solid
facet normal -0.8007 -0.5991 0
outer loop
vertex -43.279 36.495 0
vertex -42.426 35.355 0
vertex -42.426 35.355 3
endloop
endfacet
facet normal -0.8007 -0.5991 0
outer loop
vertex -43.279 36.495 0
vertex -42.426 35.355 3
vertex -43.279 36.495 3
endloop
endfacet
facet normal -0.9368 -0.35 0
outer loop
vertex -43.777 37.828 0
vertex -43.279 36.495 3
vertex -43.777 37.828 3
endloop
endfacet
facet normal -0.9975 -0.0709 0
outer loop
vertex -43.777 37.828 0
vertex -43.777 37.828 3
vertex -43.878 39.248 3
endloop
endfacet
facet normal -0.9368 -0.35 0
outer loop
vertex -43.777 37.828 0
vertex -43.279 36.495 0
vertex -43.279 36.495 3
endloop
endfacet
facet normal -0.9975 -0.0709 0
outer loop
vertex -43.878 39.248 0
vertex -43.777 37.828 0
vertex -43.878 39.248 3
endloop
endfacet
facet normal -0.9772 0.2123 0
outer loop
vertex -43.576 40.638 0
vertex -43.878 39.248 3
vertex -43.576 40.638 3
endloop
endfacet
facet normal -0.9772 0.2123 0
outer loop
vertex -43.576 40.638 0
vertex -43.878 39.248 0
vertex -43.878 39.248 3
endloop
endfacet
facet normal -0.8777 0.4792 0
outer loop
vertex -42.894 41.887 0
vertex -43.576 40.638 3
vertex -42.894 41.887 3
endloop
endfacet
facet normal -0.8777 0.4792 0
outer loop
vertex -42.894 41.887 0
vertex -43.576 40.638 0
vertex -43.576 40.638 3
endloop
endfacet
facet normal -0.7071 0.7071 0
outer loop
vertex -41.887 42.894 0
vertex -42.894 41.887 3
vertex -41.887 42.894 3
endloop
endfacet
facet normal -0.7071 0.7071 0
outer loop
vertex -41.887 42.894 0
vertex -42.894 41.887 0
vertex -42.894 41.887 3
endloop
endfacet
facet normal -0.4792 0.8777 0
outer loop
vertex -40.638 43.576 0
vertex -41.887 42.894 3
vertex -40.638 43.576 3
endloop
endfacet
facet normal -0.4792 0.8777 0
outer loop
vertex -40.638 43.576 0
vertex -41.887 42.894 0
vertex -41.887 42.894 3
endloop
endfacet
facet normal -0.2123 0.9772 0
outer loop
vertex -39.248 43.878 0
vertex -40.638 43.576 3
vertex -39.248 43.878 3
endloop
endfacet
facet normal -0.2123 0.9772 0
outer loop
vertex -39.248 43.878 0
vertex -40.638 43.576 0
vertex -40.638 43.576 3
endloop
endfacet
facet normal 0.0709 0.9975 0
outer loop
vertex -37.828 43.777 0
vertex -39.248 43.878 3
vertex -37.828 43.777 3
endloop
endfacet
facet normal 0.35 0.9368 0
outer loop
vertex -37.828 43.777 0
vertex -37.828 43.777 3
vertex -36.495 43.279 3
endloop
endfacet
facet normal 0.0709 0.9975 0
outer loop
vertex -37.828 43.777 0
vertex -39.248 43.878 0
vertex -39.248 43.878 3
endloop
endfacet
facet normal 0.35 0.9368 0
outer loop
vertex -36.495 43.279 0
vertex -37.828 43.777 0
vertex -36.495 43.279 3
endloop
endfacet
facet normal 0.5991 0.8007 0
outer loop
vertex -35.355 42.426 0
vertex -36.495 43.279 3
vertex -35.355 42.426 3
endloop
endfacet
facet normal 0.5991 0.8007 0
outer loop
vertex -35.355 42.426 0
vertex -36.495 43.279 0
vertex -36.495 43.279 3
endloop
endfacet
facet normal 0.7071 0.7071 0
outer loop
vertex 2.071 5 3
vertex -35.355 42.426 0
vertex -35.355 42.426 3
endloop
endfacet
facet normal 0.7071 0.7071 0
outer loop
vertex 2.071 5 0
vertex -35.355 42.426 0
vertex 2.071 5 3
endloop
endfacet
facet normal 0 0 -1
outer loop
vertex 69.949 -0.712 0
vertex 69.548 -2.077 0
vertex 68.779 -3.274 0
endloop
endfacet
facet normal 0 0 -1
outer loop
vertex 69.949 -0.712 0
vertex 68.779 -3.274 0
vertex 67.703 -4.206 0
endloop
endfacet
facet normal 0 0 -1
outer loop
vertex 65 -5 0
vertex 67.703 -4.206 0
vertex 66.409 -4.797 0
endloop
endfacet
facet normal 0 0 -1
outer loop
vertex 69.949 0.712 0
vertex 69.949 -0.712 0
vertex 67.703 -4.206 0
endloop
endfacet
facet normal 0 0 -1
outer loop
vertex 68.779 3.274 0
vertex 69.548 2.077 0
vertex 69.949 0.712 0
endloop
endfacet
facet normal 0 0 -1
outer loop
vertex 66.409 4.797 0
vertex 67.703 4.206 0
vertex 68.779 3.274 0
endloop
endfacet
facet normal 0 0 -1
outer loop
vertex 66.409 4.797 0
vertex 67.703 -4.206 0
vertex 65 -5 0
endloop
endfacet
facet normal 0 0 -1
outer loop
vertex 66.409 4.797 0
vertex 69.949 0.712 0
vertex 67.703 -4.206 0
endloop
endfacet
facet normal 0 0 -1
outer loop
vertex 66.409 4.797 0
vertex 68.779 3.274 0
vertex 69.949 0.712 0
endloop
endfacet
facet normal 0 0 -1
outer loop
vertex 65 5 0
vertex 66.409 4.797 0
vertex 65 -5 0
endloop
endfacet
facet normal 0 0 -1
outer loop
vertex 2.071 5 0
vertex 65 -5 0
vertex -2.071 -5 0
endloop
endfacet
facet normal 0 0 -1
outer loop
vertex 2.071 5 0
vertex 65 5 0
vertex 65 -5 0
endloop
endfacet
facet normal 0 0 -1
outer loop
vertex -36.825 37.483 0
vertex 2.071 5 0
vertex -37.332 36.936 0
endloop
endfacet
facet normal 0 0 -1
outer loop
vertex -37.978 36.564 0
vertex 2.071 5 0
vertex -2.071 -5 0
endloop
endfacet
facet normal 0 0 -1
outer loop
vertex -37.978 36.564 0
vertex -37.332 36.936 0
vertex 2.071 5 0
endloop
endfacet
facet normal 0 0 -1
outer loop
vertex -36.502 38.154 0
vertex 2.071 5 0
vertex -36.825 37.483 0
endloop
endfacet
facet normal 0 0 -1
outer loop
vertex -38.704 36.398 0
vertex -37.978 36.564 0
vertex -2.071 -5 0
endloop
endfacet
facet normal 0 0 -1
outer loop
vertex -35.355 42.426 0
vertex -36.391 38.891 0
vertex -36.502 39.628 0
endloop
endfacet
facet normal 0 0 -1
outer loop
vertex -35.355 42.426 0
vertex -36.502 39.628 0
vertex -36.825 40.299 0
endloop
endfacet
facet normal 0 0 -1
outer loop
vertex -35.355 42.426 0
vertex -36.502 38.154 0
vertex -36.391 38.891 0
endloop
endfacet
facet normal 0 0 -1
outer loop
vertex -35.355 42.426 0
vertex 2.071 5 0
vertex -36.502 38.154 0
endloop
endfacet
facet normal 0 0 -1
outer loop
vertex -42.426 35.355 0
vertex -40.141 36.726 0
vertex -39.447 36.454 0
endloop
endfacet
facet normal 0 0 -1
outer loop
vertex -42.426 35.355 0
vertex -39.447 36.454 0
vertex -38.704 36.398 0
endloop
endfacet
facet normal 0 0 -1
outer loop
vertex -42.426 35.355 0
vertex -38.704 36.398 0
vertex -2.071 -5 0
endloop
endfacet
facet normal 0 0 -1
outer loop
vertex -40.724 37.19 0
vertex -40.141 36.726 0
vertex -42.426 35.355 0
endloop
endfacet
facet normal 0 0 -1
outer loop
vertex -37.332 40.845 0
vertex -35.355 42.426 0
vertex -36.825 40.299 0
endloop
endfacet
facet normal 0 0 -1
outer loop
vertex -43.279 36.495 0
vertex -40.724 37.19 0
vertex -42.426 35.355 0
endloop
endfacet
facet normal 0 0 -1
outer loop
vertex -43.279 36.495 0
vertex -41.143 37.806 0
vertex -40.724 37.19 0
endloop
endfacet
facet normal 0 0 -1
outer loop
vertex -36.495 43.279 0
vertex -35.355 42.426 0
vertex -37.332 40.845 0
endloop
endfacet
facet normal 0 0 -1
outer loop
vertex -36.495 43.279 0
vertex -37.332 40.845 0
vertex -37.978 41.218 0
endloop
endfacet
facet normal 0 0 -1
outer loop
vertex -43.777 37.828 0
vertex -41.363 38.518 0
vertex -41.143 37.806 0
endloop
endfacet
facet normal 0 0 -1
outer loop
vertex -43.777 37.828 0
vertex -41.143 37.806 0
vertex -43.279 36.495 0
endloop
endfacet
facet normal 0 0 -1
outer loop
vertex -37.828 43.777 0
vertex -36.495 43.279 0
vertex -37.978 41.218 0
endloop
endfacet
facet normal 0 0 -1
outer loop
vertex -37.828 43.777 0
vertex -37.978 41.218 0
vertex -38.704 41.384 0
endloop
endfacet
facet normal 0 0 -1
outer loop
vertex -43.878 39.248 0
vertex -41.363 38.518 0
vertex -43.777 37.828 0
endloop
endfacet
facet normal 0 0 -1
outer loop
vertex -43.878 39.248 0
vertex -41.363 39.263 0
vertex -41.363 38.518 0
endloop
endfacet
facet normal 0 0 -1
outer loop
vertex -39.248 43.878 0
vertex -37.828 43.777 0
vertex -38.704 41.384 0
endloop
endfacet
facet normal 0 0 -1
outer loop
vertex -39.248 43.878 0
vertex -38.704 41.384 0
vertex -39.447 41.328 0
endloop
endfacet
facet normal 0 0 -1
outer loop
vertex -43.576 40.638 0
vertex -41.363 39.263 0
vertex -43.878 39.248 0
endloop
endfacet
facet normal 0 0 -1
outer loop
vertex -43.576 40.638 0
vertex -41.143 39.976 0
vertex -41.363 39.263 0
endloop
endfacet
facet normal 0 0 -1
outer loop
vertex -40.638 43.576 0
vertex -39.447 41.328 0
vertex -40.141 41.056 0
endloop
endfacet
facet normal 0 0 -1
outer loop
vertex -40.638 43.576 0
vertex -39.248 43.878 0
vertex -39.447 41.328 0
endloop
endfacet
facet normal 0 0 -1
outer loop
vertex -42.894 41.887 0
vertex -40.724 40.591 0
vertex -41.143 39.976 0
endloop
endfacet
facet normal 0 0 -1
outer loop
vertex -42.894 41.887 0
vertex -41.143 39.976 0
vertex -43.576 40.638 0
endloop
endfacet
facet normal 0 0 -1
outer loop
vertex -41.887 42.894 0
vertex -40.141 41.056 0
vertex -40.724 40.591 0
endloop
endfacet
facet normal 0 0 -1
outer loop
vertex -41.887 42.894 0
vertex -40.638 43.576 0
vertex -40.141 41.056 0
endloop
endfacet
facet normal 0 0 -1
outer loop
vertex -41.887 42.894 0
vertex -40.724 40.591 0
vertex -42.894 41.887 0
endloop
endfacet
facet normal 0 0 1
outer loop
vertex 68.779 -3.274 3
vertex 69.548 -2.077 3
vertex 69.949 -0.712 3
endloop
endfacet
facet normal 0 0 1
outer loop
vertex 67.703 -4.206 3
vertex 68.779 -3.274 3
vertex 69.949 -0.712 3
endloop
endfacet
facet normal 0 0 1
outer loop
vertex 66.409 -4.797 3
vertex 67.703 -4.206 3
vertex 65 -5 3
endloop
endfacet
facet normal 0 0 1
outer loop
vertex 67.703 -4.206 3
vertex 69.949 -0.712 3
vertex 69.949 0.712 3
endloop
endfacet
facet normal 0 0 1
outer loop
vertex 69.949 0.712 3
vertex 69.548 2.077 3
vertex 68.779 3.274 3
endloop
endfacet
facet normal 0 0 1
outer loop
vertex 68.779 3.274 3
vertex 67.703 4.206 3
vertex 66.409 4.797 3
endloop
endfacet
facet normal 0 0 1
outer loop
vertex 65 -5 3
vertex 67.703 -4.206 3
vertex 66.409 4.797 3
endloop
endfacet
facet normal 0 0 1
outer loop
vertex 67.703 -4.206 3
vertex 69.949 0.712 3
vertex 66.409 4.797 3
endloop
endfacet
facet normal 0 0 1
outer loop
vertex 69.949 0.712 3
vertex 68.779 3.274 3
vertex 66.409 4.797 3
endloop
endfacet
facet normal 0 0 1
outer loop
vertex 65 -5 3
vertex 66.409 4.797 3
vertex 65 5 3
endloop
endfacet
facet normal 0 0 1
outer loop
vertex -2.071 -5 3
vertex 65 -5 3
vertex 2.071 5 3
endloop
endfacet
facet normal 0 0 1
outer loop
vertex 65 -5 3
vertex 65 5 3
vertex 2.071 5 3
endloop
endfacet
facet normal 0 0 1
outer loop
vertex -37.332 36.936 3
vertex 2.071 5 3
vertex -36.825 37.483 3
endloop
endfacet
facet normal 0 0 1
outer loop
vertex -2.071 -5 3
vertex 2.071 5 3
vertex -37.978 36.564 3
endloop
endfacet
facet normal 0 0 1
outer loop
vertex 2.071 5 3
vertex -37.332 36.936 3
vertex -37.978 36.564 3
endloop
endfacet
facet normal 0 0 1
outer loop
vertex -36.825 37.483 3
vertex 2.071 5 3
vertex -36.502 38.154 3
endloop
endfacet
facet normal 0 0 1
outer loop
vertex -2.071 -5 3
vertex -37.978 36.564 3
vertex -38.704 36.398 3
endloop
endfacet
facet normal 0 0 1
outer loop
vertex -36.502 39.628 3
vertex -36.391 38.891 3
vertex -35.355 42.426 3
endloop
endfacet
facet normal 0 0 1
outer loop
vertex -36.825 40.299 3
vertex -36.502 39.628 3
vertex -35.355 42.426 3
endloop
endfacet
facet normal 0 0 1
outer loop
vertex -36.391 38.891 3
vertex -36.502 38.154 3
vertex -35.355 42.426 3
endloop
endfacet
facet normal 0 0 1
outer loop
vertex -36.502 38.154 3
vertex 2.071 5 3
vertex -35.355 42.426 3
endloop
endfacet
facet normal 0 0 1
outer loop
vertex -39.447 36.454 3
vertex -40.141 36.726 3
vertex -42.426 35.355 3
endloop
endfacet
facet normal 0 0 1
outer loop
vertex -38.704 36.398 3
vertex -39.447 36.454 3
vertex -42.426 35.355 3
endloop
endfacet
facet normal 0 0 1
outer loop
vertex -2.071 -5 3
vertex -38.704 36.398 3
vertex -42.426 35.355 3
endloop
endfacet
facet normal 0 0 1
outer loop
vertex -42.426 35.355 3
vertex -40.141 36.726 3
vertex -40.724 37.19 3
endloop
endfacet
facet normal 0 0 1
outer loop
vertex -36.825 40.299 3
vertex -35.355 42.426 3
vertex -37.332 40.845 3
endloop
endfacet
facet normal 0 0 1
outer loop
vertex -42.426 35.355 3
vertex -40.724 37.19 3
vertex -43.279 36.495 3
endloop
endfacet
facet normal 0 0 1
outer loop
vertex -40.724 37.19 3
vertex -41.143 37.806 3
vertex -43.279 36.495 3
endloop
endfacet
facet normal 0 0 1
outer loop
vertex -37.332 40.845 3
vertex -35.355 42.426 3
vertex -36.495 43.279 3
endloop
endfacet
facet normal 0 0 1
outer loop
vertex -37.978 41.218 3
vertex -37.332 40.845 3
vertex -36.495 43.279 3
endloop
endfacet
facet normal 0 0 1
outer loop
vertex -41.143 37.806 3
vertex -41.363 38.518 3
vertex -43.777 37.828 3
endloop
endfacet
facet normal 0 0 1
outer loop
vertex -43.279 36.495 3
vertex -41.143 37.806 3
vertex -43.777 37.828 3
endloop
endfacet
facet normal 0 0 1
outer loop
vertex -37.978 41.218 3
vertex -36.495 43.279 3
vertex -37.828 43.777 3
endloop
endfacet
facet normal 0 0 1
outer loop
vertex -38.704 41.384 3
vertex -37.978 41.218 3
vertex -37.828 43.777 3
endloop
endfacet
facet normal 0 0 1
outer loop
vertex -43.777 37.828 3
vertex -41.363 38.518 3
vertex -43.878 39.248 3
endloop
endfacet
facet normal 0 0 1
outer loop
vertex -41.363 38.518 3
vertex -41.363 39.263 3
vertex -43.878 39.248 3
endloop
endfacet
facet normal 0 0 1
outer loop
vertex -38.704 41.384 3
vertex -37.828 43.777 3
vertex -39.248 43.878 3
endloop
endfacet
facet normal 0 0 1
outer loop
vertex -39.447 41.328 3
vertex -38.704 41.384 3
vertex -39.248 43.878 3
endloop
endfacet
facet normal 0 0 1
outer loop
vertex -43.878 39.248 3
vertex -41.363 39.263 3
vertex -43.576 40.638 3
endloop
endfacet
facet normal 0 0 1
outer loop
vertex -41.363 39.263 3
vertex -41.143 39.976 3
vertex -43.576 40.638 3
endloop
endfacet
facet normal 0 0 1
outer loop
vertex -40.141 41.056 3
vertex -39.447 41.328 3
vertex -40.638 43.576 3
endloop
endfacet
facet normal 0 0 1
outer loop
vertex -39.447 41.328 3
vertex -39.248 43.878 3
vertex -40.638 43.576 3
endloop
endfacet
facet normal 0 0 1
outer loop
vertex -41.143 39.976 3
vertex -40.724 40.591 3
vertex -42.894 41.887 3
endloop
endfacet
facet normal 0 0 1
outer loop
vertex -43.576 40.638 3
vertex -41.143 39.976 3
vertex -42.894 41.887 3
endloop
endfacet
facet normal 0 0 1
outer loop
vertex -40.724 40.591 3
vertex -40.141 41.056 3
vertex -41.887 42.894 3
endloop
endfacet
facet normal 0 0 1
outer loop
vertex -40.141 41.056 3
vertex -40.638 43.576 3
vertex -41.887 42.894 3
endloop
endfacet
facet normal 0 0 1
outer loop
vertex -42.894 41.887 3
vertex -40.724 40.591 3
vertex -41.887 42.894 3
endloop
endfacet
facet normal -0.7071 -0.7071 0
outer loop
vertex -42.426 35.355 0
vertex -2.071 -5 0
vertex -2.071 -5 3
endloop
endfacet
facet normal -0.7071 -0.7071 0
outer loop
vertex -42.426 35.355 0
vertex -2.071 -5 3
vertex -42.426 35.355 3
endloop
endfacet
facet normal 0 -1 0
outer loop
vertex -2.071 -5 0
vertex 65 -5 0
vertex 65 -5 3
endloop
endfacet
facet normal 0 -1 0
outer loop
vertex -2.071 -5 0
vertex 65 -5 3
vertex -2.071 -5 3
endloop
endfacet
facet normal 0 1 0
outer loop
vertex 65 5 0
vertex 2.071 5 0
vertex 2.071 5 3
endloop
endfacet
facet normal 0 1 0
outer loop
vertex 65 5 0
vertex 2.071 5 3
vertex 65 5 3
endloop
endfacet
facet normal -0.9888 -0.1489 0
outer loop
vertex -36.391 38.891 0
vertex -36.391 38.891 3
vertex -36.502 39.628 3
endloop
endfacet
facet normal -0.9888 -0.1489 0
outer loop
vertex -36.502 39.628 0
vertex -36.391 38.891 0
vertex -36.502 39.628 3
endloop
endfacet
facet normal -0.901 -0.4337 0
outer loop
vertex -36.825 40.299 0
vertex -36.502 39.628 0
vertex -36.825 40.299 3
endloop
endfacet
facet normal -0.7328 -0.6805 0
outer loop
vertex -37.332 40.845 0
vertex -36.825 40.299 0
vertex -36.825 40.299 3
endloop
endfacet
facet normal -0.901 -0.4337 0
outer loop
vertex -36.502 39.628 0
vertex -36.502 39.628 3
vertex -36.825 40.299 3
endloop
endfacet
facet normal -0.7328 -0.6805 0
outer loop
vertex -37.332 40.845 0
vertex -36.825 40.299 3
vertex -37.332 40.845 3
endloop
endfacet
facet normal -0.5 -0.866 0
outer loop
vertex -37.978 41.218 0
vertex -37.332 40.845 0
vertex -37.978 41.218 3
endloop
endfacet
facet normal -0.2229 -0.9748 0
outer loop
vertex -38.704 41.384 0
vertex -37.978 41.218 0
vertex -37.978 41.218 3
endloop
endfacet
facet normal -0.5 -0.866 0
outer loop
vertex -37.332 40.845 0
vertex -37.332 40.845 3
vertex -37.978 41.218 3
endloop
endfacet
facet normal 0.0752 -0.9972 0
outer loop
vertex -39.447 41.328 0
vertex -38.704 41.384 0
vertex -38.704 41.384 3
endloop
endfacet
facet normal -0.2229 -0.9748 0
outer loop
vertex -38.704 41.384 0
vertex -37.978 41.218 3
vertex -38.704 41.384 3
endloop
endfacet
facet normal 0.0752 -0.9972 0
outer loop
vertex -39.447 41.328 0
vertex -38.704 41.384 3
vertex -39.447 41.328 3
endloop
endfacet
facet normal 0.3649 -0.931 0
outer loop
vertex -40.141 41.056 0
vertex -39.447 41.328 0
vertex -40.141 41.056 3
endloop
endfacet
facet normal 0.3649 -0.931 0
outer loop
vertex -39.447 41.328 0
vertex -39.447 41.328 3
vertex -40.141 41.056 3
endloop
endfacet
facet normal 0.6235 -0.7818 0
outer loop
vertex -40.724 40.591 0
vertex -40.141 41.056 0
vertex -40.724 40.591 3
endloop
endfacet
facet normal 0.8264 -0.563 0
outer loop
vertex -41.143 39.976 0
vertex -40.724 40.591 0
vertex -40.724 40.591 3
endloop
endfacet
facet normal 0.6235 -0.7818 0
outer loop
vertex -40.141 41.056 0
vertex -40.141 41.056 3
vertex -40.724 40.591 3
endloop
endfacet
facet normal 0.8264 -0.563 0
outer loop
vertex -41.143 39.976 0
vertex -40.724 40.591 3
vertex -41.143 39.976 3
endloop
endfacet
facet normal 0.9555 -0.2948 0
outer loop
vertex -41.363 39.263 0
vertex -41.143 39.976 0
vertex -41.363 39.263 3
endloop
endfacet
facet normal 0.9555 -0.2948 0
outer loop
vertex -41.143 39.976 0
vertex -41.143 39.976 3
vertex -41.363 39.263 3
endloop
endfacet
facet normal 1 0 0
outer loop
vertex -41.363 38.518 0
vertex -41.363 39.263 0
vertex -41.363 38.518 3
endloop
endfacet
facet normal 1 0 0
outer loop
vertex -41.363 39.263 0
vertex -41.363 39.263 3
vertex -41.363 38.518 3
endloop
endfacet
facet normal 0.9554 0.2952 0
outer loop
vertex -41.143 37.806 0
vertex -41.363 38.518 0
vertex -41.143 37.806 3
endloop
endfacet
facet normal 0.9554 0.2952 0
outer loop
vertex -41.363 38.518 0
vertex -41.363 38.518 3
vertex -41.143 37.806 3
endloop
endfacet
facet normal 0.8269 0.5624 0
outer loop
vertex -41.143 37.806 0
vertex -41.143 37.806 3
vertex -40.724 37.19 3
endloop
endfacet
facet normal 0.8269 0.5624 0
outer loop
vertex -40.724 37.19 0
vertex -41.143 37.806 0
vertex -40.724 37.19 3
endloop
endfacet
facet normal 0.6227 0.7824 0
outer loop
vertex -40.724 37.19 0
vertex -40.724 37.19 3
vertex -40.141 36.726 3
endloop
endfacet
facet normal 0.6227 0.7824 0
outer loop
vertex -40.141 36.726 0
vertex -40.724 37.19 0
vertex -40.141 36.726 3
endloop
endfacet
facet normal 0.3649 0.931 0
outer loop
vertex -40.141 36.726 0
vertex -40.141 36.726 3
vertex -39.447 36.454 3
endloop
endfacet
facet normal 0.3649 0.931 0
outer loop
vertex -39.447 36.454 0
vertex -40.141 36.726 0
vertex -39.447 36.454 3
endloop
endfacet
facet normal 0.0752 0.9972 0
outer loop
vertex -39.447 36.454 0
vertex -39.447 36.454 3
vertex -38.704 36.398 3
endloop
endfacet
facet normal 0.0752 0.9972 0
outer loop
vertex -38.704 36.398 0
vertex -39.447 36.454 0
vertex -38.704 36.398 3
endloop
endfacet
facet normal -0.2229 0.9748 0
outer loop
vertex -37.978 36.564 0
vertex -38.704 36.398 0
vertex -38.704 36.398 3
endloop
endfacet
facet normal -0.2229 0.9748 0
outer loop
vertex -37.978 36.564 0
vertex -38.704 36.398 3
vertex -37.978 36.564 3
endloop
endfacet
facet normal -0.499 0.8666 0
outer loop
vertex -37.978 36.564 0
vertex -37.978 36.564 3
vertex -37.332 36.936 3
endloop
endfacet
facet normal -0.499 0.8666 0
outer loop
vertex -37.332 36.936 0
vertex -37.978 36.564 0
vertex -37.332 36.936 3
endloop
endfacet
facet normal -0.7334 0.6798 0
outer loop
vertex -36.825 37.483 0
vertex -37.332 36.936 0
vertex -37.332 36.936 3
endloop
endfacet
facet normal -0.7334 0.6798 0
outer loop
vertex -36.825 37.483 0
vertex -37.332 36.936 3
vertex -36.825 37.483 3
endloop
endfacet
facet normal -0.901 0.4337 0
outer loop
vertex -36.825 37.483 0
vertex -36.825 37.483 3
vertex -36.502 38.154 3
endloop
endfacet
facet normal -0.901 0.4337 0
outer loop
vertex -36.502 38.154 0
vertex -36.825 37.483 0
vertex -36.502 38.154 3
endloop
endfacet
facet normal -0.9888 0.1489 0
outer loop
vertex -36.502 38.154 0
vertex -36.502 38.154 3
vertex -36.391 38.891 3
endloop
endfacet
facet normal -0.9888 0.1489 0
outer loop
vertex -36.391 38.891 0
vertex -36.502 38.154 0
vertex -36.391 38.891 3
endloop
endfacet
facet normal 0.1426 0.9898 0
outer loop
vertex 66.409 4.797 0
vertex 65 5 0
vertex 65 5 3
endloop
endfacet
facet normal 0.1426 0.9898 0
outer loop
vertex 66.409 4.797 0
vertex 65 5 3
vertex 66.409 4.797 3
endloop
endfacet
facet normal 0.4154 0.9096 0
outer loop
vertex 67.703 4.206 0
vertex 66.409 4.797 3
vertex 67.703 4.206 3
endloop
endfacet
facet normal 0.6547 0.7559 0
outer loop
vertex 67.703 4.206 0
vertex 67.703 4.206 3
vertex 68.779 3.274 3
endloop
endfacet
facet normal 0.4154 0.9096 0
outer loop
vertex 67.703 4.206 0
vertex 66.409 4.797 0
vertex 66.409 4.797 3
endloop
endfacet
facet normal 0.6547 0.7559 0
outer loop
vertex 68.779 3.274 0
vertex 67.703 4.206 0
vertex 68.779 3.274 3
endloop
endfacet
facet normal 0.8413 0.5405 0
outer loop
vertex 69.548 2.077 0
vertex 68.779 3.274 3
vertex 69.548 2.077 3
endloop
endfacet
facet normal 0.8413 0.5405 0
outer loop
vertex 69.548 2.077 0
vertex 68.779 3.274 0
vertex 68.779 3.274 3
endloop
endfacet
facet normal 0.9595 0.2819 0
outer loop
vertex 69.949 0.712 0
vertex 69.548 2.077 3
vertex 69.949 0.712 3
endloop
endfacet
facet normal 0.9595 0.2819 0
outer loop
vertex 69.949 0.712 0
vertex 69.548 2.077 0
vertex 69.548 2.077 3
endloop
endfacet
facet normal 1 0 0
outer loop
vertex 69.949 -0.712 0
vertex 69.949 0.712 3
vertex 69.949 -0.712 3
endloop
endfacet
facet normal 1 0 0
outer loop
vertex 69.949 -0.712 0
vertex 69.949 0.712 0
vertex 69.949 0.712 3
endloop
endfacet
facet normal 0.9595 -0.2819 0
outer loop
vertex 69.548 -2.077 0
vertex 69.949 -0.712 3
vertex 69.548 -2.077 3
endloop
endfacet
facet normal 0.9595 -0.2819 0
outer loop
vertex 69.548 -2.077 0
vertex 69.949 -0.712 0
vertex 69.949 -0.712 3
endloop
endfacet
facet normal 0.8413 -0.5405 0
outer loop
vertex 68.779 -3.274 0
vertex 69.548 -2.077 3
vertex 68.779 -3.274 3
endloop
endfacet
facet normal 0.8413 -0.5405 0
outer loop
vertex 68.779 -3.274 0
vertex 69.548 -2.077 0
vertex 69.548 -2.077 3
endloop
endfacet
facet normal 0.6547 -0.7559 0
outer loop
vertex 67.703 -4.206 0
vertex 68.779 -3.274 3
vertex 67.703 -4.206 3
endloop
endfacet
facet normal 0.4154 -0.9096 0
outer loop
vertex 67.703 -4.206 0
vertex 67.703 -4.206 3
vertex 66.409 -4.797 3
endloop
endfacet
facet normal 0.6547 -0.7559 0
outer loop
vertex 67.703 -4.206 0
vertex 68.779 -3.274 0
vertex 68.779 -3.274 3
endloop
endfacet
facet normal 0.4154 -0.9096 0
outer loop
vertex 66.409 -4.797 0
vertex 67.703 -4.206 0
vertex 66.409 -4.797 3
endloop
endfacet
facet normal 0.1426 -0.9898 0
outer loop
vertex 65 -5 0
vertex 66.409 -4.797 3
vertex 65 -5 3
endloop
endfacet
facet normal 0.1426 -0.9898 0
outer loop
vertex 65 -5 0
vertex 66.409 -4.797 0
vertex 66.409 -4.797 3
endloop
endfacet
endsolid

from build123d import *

# Parameters (mm, degrees)
BOSS_EXTRUDE1_DEPTH = 3
SKETCH3_R           = 2.5
CUT_EXTRUDE1_DEPTH  = 11


with BuildPart() as part:
    # Sketch2 → Boss-Extrude1 (new body)
    with BuildSketch(Plane.XY):
        with BuildLine():
            Line((2.071067812, 5), (65, 5))
            ThreePointArc((65, 5), (70, 0), (65, -5))
            Line((65, -5), (-2.071067812, -5))
            Line((-2.071067812, -5), (-42.426406871, 35.355339059))
            ThreePointArc((-42.426406871, 35.355339059), (-42.426406871, 42.426406871), (-35.355339059, 42.426406871))
            Line((-35.355339059, 42.426406871), (2.071067812, 5))
        make_face()
    extrude(amount=BOSS_EXTRUDE1_DEPTH)

    # Sketch3 → Cut-Extrude1 (cut)
    with BuildSketch(Plane.XY.offset(3)):
        with Locations((-38.890872965, 38.890872965)):
            Circle(SKETCH3_R)
    extrude(amount=-CUT_EXTRUDE1_DEPTH, mode=Mode.SUBTRACT)


solid = part.part
